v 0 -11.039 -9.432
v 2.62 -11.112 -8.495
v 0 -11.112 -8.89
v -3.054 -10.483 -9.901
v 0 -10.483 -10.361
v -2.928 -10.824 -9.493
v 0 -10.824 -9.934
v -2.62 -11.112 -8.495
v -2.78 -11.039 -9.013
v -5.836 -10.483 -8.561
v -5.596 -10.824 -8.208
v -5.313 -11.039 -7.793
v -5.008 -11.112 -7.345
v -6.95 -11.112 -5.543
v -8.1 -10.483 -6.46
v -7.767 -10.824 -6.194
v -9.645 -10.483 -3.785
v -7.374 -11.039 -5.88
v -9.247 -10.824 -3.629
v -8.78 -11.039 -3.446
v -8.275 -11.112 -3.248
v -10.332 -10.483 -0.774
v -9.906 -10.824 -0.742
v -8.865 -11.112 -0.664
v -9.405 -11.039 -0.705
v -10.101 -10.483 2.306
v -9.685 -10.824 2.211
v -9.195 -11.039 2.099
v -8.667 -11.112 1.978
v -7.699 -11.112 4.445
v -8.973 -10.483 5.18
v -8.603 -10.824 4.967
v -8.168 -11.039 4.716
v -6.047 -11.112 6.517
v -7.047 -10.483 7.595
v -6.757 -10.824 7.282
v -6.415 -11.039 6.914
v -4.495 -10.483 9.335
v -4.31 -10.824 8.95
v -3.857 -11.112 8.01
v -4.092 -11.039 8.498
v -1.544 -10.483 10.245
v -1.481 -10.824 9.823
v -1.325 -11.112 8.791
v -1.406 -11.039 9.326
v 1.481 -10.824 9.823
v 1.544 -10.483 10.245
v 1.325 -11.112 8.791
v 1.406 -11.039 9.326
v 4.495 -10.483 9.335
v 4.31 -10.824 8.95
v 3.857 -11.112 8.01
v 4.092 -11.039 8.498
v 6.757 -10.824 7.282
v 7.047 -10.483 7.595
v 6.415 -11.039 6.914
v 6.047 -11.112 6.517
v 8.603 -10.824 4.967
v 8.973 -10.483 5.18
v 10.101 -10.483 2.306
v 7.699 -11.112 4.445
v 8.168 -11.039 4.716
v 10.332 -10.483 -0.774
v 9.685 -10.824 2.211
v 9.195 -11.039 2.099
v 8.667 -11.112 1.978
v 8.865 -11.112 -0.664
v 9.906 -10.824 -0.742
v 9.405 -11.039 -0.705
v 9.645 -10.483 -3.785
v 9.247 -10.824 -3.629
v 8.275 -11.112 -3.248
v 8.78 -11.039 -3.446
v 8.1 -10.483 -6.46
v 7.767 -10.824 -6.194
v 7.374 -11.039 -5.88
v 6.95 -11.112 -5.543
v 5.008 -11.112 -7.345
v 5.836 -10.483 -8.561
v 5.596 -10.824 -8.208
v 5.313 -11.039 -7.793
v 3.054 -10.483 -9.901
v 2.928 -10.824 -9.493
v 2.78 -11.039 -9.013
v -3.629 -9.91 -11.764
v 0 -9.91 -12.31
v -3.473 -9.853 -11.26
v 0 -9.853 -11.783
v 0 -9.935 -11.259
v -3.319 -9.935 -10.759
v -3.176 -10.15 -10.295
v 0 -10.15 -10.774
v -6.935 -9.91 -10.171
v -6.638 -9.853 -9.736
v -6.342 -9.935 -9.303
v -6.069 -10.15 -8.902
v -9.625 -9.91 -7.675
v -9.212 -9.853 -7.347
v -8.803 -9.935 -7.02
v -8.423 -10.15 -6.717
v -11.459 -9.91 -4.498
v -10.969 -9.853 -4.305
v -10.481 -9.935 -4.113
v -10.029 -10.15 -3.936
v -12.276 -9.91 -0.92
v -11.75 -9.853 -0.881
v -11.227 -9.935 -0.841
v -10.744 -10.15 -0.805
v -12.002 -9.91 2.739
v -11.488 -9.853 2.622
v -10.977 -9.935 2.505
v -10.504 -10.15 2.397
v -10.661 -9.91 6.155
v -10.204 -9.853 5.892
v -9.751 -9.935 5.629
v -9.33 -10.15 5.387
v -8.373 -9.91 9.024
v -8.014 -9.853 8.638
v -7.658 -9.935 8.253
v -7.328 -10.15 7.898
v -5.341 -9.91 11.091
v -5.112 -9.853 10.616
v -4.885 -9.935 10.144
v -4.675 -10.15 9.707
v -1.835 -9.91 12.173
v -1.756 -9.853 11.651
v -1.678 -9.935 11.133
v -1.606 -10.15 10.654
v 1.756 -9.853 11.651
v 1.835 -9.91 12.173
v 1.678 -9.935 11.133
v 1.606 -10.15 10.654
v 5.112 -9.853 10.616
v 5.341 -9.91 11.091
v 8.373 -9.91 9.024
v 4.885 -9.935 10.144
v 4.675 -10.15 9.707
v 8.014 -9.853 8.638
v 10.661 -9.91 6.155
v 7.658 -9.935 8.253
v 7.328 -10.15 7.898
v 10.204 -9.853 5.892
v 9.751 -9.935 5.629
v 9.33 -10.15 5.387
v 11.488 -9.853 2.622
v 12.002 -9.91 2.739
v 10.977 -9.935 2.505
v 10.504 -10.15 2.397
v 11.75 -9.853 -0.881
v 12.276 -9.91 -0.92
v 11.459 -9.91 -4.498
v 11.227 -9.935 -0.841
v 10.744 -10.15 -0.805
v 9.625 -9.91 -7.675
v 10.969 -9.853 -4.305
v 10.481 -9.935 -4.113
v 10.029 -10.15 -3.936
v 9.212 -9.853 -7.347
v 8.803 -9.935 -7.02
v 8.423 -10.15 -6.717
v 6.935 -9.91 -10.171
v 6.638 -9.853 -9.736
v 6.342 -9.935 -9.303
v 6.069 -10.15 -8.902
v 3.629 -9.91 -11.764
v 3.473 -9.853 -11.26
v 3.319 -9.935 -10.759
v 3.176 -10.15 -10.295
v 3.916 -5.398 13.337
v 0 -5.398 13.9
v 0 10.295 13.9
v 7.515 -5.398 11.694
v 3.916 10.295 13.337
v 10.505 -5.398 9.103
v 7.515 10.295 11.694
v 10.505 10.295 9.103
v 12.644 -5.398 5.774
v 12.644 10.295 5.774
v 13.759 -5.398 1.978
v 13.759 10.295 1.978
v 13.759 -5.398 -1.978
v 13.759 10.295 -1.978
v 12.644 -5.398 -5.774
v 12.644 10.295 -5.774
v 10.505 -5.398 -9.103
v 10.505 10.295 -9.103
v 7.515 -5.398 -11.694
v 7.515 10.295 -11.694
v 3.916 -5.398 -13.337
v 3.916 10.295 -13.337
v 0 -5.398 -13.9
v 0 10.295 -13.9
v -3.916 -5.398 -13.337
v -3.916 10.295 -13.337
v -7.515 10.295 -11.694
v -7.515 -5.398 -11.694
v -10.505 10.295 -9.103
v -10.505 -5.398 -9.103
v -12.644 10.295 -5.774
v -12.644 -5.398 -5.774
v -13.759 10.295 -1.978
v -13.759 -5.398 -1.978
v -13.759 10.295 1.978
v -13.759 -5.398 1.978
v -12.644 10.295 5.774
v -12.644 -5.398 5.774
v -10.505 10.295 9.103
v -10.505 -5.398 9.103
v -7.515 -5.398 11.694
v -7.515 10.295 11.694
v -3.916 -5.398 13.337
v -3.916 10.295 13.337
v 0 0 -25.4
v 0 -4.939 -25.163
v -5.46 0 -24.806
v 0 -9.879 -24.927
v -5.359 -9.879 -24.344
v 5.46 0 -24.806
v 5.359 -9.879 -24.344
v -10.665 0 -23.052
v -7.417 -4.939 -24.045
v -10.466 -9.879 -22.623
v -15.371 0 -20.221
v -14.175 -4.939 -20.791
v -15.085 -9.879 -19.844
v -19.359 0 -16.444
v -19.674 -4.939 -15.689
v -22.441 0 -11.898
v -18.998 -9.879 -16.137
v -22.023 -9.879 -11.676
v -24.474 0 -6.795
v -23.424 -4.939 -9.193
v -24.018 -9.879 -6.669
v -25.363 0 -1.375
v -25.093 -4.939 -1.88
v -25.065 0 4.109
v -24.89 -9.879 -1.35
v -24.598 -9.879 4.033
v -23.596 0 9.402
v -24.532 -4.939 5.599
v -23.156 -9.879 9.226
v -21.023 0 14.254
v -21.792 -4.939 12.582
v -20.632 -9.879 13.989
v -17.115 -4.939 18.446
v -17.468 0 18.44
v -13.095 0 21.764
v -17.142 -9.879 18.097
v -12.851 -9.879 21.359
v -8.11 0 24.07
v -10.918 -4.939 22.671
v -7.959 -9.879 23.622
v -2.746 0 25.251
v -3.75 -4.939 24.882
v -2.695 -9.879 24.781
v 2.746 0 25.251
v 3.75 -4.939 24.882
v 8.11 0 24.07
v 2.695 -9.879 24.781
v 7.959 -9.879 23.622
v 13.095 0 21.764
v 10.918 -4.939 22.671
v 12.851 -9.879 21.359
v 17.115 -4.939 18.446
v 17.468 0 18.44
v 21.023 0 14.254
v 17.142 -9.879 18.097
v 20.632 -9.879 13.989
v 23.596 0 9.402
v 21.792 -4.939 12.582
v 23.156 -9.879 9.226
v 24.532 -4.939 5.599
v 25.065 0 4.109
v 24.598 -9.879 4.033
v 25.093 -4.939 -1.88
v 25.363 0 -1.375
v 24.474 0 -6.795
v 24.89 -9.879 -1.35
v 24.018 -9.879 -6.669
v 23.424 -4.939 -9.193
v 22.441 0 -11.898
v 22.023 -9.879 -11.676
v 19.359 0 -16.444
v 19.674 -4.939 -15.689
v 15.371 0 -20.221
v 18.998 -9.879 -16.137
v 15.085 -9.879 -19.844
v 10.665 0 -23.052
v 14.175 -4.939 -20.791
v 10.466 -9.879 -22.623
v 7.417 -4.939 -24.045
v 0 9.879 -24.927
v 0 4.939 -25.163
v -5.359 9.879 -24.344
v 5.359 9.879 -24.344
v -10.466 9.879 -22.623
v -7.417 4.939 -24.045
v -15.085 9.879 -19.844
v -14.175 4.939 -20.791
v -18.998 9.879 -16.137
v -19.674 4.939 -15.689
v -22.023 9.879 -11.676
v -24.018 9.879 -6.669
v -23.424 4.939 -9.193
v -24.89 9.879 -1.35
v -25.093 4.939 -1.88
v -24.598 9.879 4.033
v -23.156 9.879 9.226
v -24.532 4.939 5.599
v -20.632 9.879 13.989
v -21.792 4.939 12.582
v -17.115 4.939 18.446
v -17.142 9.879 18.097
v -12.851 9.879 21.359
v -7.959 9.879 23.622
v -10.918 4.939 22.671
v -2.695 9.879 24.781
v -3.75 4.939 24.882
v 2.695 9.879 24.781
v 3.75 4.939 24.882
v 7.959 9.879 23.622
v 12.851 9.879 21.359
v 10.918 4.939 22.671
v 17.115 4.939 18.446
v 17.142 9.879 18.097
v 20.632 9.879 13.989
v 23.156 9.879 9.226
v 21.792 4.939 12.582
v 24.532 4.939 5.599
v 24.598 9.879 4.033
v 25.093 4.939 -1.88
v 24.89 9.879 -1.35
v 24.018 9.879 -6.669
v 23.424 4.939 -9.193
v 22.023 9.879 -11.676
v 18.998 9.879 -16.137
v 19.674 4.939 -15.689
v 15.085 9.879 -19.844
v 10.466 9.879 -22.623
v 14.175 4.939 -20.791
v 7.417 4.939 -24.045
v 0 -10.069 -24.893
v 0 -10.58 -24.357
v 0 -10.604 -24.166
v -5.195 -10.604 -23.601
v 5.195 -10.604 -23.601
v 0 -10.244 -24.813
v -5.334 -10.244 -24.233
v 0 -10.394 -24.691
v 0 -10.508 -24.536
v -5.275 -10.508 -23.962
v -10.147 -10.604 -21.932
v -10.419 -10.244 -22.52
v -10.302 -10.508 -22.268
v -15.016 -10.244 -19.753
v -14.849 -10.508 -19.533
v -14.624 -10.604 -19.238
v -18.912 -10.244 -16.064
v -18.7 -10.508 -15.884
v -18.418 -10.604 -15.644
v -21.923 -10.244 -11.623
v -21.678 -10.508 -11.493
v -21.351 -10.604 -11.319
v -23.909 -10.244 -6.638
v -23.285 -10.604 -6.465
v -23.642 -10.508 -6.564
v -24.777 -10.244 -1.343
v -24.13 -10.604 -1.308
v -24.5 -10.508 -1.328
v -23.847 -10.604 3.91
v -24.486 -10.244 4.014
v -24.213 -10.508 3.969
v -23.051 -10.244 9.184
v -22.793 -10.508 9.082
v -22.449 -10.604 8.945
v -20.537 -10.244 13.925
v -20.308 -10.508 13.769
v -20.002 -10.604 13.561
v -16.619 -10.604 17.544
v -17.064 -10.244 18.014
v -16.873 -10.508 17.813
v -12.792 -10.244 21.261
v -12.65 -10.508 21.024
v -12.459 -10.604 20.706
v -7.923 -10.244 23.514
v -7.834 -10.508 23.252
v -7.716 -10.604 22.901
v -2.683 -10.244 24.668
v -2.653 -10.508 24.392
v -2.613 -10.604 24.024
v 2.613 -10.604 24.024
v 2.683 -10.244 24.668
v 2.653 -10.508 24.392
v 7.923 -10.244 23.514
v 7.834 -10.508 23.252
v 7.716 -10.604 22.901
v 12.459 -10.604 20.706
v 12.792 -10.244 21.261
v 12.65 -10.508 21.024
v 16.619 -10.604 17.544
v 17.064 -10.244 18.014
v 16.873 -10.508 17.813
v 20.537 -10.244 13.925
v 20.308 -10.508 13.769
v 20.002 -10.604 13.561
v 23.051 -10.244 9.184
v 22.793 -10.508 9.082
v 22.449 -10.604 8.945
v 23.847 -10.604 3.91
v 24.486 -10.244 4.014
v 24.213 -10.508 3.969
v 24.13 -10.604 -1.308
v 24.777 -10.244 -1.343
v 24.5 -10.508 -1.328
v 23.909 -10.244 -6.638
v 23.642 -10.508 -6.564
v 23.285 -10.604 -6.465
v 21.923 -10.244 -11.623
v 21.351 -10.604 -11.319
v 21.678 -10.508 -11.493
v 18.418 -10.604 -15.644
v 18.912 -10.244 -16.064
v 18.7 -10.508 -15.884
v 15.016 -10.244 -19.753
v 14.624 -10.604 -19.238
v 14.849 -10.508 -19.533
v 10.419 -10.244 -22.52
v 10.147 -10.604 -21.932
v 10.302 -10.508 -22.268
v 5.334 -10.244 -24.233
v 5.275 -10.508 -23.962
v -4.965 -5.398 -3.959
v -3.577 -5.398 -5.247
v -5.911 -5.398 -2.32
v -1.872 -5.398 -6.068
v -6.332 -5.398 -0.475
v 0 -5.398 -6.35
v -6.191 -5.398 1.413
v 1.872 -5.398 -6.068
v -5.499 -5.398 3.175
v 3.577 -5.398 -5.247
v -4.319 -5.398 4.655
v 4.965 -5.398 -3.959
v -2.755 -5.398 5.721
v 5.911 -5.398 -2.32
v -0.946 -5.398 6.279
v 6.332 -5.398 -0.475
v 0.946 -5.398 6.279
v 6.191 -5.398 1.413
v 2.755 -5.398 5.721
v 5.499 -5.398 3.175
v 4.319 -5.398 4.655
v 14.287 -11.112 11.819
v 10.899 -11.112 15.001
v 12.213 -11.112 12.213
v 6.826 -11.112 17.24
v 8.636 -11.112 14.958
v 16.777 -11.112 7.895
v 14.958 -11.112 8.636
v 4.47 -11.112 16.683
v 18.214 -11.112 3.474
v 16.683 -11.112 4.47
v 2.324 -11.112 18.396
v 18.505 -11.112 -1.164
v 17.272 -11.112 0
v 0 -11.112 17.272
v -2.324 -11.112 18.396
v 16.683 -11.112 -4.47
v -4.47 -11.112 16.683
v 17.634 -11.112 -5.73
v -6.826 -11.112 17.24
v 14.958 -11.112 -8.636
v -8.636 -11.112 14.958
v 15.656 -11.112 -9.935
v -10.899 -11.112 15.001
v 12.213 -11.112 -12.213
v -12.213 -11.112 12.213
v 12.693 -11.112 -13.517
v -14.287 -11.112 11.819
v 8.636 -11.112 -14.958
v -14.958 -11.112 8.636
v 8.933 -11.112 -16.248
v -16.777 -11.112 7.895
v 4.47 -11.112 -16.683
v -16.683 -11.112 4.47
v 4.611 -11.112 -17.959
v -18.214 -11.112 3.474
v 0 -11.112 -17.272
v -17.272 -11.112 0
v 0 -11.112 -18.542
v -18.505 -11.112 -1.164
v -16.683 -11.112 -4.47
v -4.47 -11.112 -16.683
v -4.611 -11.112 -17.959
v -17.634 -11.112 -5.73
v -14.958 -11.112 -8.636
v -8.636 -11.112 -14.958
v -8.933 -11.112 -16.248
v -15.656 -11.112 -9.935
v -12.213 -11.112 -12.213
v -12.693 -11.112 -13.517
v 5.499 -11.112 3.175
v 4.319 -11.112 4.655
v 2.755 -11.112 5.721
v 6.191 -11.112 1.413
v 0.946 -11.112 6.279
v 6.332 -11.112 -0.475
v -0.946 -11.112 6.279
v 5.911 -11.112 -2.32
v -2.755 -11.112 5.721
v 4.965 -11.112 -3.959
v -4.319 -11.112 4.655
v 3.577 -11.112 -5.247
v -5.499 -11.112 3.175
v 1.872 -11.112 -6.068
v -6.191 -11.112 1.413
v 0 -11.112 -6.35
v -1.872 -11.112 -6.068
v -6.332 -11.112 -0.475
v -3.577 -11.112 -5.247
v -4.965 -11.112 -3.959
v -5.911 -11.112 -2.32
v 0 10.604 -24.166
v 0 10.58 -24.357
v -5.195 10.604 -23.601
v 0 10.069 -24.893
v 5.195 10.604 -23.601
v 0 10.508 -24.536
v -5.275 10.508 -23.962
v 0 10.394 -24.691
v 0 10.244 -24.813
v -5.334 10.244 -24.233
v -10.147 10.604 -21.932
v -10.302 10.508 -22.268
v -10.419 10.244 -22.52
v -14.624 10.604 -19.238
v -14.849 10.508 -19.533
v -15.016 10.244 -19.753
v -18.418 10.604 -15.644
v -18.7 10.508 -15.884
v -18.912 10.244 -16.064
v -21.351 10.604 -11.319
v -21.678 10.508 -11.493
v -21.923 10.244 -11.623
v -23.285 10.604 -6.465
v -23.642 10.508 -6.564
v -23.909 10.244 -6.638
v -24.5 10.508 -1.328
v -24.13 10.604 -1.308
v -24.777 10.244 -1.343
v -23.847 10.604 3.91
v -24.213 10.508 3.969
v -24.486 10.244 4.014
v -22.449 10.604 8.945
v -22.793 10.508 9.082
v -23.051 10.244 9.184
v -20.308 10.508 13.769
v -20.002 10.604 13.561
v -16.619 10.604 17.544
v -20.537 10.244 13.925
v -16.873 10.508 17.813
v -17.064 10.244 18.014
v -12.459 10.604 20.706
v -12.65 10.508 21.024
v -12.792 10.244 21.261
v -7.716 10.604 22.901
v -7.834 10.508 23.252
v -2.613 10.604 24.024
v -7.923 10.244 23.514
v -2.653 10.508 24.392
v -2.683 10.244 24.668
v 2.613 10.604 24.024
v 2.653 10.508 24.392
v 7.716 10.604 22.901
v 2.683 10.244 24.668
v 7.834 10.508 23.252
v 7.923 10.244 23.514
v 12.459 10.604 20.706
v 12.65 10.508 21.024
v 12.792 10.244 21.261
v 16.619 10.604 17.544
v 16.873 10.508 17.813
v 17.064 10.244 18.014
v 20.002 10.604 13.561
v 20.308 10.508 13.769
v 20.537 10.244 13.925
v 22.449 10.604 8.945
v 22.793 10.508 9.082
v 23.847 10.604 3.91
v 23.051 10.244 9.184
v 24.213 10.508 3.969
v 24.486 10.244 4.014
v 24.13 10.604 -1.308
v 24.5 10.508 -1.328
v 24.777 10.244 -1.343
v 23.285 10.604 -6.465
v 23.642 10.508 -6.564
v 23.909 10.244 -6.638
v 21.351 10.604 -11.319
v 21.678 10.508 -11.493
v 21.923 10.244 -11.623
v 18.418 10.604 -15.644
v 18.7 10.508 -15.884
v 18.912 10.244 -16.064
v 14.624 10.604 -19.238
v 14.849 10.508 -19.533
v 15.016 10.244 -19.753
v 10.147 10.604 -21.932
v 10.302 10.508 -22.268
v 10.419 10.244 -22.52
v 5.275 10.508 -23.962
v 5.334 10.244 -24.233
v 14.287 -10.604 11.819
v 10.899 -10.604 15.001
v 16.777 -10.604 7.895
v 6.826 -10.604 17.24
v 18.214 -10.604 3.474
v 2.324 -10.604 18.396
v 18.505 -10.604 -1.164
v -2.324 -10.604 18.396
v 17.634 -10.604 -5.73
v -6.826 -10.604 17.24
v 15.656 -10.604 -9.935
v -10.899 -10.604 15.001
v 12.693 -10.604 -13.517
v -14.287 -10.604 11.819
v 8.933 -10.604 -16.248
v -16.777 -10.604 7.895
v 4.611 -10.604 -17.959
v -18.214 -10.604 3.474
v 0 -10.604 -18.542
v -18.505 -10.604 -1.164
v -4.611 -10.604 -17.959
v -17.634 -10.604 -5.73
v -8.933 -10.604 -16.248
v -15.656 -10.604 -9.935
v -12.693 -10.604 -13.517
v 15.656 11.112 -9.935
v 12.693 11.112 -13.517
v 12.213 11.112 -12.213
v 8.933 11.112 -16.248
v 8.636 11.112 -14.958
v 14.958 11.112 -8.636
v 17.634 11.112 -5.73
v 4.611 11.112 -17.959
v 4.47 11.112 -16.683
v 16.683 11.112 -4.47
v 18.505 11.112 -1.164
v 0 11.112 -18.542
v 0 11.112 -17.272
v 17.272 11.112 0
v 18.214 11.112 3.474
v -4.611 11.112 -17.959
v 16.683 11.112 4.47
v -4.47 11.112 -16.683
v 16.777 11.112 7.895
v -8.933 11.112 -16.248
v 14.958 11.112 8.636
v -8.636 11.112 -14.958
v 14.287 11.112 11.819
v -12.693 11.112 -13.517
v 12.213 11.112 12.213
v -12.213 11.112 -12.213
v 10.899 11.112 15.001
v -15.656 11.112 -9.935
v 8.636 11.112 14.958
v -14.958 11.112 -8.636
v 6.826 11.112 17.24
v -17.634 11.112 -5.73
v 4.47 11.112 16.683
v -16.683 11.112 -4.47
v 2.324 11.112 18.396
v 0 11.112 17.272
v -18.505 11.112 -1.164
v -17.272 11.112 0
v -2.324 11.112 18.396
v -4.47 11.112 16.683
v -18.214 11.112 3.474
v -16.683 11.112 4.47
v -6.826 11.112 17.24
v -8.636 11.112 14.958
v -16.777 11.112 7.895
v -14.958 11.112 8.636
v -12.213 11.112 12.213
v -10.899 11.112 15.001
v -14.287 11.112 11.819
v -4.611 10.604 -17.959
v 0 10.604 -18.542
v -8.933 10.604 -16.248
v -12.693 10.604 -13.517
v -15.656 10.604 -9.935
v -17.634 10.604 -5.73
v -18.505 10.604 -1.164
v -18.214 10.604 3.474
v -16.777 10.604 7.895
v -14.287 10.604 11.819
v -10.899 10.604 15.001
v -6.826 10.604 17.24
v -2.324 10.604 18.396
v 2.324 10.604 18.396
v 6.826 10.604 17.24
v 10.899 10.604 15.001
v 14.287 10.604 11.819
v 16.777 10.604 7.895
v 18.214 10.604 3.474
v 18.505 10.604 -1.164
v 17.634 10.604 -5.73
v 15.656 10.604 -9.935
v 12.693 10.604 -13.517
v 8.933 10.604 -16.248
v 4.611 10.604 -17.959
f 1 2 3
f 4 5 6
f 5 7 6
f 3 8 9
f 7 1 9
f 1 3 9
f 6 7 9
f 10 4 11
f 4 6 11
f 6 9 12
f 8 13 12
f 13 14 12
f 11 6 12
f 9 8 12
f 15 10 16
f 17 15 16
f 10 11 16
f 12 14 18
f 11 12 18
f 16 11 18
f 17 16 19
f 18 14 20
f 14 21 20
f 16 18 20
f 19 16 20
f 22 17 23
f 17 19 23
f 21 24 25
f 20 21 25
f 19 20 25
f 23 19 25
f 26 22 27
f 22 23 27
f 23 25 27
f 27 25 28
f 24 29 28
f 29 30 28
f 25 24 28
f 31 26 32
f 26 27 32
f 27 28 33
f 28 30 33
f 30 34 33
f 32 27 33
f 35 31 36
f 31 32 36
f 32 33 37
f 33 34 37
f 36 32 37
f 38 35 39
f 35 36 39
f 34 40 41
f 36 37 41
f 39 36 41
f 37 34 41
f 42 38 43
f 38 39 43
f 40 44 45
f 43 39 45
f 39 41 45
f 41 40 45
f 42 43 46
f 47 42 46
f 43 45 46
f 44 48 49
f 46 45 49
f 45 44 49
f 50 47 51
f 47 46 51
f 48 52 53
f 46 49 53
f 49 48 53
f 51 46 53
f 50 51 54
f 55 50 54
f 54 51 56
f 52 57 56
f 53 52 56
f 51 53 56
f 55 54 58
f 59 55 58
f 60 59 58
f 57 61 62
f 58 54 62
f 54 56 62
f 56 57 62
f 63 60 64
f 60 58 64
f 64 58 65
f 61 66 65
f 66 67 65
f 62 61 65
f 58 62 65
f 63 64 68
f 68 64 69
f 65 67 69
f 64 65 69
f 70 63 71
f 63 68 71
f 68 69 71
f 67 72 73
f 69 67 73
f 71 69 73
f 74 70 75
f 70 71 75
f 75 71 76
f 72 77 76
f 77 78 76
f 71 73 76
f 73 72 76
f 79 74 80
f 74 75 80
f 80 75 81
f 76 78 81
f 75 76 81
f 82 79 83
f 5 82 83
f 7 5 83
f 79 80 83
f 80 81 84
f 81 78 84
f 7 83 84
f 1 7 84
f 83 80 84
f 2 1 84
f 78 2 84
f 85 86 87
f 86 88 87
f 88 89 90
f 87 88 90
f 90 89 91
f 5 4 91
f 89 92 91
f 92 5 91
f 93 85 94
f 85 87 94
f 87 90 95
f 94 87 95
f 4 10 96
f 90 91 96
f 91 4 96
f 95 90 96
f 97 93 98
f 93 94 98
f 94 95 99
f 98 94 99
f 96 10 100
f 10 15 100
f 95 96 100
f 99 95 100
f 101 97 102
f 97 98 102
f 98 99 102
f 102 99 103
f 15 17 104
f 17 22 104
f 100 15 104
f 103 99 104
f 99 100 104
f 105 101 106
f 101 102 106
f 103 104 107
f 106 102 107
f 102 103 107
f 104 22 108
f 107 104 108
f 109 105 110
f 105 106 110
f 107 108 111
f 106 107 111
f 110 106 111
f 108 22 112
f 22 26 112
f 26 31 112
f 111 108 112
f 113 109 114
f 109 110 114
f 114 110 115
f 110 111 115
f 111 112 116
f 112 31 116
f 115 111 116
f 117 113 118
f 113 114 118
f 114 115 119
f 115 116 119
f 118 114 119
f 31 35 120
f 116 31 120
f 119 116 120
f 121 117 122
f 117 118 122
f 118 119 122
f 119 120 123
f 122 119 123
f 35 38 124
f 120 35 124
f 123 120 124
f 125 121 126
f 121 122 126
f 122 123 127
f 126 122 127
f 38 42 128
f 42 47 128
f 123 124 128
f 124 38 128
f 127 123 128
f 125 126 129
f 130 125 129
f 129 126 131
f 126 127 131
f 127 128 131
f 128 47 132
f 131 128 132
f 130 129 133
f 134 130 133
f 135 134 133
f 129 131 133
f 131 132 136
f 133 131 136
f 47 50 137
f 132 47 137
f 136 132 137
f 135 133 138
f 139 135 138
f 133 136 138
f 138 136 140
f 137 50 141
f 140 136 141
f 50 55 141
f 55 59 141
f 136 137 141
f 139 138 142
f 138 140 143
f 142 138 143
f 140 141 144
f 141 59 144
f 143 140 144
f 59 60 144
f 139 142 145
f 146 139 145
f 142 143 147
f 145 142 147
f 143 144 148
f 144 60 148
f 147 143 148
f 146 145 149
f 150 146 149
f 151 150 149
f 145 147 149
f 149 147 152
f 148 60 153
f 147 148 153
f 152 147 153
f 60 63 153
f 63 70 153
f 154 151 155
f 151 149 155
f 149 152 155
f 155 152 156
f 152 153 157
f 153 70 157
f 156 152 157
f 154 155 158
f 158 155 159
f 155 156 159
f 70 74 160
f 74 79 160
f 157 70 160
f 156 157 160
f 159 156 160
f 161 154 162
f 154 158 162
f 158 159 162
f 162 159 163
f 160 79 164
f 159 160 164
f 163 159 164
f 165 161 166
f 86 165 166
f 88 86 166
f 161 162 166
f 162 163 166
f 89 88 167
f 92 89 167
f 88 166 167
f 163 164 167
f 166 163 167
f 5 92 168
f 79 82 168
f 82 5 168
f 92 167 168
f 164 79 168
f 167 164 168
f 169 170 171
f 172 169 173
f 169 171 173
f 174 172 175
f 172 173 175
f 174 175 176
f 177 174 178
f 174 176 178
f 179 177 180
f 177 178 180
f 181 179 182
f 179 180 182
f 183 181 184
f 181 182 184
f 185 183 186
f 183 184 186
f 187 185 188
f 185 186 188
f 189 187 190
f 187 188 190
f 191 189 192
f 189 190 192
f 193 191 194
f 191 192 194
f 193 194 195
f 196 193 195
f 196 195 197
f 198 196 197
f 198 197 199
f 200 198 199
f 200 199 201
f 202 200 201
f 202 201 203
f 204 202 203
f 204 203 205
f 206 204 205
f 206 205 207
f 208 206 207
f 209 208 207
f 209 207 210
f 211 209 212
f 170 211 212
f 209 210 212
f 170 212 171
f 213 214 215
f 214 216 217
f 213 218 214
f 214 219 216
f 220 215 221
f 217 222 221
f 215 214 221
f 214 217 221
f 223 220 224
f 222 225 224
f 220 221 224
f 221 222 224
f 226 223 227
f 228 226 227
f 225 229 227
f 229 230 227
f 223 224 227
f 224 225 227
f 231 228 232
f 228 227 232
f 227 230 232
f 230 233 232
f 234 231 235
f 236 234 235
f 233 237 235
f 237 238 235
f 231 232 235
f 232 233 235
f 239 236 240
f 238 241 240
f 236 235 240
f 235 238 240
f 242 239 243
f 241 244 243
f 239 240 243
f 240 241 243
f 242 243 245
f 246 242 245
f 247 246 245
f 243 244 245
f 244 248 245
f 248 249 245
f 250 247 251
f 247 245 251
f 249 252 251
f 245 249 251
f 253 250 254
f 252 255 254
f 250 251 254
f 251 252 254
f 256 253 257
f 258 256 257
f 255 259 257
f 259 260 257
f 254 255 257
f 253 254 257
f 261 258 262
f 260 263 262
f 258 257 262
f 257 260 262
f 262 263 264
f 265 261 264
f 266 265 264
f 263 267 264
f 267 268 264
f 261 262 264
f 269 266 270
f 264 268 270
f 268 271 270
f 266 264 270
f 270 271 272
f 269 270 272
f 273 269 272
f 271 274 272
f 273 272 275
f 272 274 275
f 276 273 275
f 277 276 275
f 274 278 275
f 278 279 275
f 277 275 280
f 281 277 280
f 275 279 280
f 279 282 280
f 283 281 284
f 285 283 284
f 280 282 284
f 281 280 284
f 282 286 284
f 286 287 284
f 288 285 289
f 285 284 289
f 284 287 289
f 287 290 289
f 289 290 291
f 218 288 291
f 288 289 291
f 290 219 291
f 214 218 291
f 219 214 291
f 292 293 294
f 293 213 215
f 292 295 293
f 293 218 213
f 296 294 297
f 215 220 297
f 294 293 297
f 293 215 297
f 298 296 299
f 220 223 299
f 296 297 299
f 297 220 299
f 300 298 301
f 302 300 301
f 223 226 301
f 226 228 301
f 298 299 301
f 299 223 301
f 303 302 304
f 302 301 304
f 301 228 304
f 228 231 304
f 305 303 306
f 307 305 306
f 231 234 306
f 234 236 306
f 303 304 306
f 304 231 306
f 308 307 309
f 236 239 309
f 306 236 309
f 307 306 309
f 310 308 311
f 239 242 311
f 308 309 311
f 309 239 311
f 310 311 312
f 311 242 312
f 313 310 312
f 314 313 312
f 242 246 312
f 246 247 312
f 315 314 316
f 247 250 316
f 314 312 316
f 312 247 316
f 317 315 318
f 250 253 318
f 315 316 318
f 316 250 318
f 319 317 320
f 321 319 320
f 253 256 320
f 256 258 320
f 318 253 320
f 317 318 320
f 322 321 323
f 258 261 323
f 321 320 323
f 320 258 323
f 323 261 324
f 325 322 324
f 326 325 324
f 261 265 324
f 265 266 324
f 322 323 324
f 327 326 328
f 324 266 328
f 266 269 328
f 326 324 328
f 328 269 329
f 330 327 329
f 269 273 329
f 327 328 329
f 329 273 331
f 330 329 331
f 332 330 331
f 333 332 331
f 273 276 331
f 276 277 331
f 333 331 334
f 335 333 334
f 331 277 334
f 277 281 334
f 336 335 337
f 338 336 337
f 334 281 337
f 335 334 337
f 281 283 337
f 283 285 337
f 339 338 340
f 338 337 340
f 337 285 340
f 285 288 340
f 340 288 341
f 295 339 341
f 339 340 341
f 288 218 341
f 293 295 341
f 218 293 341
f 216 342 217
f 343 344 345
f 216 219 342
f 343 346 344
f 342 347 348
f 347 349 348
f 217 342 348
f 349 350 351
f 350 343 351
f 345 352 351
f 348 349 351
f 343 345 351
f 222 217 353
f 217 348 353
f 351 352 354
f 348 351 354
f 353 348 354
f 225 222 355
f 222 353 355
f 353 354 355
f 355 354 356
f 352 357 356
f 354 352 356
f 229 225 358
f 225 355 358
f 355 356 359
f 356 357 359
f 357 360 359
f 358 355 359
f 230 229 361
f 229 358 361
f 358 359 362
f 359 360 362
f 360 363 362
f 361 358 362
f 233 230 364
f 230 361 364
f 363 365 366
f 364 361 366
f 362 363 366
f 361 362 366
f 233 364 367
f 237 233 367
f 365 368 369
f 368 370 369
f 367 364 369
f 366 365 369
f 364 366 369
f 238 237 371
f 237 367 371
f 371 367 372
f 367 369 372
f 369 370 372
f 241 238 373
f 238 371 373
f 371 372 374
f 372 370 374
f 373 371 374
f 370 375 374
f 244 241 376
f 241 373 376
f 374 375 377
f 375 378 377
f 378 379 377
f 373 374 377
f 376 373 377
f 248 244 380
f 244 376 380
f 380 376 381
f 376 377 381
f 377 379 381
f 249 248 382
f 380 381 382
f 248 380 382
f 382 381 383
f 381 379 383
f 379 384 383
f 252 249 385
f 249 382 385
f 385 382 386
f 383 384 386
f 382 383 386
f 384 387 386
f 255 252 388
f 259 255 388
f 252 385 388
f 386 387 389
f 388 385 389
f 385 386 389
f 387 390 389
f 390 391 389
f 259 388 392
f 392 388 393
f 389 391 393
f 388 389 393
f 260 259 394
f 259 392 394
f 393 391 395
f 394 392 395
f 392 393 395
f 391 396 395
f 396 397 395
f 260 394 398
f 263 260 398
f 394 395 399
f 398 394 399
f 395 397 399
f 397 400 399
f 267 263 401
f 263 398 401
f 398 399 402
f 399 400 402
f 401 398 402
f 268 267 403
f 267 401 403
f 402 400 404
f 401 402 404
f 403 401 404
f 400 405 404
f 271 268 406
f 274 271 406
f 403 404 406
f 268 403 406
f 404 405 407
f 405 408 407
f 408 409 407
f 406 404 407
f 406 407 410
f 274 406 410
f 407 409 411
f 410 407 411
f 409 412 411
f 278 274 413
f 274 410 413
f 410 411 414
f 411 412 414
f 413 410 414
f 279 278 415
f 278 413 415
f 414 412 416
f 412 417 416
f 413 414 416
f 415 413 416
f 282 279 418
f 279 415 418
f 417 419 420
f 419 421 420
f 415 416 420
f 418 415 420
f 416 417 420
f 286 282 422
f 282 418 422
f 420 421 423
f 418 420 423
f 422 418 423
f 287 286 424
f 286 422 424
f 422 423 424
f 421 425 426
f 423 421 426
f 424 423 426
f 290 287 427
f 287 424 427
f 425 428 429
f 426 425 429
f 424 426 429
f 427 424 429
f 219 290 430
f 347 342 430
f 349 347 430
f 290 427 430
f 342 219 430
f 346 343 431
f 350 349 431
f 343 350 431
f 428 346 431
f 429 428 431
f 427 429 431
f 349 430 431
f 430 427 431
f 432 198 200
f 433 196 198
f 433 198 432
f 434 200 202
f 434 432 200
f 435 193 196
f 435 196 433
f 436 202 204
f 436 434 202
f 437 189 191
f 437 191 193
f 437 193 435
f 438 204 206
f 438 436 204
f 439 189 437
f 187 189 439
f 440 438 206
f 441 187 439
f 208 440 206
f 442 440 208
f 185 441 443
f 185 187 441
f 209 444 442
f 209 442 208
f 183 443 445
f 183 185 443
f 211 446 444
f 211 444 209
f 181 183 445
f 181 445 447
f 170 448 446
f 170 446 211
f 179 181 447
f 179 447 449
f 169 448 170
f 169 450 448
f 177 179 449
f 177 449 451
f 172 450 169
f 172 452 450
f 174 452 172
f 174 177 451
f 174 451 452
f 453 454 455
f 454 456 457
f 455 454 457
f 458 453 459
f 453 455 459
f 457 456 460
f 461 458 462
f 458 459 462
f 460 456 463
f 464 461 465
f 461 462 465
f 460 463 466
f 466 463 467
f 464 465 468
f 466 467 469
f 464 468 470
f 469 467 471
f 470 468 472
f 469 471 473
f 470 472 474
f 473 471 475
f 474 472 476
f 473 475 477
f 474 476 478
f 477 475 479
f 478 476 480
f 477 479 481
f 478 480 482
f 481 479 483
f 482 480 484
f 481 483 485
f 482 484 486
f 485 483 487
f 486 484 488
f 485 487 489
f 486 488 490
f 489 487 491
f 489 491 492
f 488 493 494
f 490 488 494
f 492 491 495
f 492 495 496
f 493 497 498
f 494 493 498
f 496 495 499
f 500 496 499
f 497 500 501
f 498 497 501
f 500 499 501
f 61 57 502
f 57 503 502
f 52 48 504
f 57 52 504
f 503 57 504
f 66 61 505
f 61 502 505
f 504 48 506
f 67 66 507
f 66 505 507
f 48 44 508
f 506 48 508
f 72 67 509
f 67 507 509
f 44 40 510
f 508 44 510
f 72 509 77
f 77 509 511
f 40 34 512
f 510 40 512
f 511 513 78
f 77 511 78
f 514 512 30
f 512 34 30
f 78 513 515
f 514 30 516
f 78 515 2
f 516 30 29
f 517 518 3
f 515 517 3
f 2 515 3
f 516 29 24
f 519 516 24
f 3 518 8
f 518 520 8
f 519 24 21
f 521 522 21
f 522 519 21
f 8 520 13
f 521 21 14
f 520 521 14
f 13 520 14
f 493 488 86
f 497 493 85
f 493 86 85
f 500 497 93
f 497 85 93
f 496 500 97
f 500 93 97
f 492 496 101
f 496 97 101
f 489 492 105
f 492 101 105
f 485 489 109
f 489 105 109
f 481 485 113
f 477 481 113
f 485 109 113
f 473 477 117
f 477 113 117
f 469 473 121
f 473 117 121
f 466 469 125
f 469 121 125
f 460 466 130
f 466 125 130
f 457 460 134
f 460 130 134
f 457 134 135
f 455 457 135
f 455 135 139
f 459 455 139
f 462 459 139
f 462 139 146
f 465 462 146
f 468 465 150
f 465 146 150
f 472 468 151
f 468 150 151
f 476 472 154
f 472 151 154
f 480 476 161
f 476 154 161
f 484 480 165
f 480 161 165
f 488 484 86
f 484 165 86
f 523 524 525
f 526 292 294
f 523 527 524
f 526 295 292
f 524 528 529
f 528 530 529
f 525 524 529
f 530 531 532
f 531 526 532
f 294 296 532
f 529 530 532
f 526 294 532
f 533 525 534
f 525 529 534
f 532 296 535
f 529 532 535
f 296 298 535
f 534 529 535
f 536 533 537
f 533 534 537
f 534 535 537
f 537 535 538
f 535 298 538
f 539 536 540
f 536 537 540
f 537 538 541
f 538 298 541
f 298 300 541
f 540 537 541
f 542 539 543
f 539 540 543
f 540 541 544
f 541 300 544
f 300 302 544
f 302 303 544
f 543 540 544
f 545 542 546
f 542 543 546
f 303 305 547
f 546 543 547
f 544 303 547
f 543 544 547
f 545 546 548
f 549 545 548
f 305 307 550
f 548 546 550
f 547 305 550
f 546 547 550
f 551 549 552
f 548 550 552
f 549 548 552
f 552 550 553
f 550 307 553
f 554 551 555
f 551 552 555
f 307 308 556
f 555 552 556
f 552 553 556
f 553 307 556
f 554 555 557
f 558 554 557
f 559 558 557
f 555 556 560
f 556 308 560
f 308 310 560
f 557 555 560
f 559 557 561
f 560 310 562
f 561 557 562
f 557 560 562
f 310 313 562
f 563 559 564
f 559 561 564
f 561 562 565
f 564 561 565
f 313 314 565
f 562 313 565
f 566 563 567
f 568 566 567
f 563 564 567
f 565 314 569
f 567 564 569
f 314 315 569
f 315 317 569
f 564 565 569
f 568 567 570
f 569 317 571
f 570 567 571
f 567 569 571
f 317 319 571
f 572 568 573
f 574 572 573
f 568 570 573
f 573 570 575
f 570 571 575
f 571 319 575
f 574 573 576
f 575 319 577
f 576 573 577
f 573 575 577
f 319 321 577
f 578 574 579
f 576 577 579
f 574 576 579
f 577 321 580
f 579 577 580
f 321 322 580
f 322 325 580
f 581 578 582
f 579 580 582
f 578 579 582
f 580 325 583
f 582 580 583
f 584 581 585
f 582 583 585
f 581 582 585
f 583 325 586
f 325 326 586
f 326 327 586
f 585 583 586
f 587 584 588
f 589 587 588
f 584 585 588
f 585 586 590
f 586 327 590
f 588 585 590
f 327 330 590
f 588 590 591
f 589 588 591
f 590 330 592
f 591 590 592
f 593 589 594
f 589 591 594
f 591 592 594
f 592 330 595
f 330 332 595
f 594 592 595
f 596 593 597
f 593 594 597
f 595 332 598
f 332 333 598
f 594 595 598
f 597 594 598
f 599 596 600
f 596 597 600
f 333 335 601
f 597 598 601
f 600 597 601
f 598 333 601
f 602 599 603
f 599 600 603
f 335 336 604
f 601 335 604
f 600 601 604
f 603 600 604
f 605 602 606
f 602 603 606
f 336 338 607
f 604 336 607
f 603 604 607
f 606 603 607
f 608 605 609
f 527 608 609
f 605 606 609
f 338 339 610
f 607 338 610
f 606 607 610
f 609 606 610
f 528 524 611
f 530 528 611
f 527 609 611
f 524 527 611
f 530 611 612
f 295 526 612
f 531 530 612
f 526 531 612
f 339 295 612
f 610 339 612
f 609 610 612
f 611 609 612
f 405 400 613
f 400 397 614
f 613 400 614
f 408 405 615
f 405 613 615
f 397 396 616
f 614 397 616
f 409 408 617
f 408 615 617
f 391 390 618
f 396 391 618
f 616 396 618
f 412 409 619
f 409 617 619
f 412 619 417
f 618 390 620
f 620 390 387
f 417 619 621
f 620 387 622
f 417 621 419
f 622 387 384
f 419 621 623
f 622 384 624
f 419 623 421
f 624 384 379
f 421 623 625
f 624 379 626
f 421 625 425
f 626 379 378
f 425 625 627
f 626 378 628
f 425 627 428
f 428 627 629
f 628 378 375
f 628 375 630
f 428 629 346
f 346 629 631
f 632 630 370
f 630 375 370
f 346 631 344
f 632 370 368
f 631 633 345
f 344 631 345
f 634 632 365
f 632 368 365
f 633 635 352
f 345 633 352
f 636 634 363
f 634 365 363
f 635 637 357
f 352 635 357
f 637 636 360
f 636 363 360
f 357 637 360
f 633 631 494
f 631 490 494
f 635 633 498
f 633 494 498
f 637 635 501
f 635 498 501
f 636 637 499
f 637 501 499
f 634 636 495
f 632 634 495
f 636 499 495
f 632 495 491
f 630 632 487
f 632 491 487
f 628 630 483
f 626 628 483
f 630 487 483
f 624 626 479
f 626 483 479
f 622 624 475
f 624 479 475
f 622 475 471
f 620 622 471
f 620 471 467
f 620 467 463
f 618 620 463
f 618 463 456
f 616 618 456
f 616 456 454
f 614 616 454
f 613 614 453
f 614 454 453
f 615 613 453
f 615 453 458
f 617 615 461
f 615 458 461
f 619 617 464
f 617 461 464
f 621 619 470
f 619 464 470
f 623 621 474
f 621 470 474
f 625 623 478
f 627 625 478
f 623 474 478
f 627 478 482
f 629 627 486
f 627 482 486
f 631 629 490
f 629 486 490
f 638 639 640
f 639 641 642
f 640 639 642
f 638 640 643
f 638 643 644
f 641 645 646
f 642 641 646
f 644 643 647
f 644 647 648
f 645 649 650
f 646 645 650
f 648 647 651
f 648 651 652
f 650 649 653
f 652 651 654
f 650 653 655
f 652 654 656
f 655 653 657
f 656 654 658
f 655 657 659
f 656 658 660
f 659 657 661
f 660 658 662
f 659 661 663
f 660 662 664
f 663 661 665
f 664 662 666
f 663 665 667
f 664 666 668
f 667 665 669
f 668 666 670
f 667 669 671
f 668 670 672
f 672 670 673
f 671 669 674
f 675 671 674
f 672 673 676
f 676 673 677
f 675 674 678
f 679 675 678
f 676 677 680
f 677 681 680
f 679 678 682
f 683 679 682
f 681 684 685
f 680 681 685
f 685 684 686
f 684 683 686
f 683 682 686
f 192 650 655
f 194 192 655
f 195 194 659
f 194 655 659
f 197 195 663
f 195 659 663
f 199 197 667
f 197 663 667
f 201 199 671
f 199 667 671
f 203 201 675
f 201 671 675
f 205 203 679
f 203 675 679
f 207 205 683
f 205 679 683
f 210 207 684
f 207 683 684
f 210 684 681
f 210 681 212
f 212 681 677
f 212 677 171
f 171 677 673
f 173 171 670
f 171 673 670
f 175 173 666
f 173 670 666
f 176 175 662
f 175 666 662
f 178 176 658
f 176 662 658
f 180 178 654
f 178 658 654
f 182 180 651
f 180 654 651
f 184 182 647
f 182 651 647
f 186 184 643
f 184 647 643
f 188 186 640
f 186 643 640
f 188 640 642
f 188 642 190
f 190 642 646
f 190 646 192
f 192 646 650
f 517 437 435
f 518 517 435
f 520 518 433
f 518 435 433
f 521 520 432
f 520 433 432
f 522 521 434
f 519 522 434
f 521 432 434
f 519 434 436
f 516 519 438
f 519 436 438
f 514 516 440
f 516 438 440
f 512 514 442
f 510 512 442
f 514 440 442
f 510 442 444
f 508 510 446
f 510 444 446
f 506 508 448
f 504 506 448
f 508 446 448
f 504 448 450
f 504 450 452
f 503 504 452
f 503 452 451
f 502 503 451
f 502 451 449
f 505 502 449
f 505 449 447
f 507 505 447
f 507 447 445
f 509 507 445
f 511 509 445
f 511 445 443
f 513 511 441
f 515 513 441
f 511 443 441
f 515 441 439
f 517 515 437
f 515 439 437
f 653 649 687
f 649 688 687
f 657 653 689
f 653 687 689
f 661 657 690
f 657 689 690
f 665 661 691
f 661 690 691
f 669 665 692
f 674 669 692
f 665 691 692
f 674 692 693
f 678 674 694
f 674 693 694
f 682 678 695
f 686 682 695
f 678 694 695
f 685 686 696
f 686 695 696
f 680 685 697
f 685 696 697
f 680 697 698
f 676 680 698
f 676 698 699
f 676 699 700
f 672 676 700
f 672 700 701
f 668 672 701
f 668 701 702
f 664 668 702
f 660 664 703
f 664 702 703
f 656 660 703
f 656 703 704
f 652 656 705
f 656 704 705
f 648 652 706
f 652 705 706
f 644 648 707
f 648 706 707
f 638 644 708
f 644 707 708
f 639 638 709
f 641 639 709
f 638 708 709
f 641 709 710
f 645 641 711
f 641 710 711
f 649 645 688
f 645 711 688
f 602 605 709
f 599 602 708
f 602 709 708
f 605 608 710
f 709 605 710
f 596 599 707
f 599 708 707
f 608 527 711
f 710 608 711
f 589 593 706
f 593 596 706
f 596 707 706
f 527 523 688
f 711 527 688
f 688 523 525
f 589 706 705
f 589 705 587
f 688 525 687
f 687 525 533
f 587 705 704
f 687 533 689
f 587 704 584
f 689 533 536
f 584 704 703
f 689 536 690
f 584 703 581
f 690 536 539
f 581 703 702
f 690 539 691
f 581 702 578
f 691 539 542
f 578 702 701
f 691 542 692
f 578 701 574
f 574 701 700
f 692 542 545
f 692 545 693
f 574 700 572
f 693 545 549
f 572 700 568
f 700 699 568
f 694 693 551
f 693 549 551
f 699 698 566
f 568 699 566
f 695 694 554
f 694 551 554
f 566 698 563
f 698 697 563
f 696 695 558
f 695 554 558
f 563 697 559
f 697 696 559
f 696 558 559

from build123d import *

# Parameters (mm, degrees)
FILLET1_R          = 0.762
SKETCH3_R          = 13.90015
CUT_EXTRUDE1_DEPTH = 16.51


with BuildPart() as part:
    # Sketch2 → Revolve1 (revolve)
    with BuildSketch(Plane.XY, mode=Mode.PRIVATE) as revolve1_sk:
        with BuildLine():
            Line((6.35, -11.1125), (6.35, 11.1125))
            Line((6.35, 11.1125), (8.89, 11.1125))
            ThreePointArc((8.89, 11.1125), (9.690049959, 10.948371533), (10.360856835, 10.482500061))
            ThreePointArc((10.360856835, 10.482500061), (11.258914316, 9.934904036), (12.310452921, 9.909700708))
            Line((12.310452921, 9.909700708), (17.272, 11.1125))
            Line((17.272, 11.1125), (18.542, 11.1125))
            Line((18.542, 11.1125), (18.542, 10.6045))
            Line((18.542, 10.6045), (24.892, 10.6045))
            Line((24.892, 10.6045), (25.4, 0))
            Line((25.4, 0), (24.892, -10.6045))
            Line((24.892, -10.6045), (18.542, -10.6045))
            Line((18.542, -10.6045), (18.542, -11.1125))
            Line((18.542, -11.1125), (17.272, -11.1125))
            Line((17.272, -11.1125), (12.310452921, -9.909700708))
            ThreePointArc((12.310452921, -9.909700708), (11.258914316, -9.934904036), (10.360856835, -10.482500061))
            ThreePointArc((10.360856835, -10.482500061), (9.690049959, -10.948371533), (8.89, -11.1125))
            Line((8.89, -11.1125), (6.35, -11.1125))
        make_face()
    revolve(revolve1_sk.sketch.rotate(Axis((0, 0, 0), (0, 1, 0)), 90), axis=Axis((0, 0, 0), (0, 1, 0)))  # turned: the seam where the file's is

    # Fillet1
    fillet1_edges = [part.edges().sort_by_distance(p)[0] for p in [
        (0, -10.6045, 24.892),
        (0, 10.6045, 24.892),
    ]]
    fillet(fillet1_edges, radius=FILLET1_R)

    # Sketch3 → Cut-Extrude1 (cut)
    with BuildSketch(Plane(origin=(0, 11.1125, 0), x_dir=(-1, 0, 0), z_dir=(0, 1, 0))):
        with Locations(Location((0, 0, 0), (0, 0, 90))):  # turned: the seam where the file's is
            Circle(SKETCH3_R)
    extrude(amount=-CUT_EXTRUDE1_DEPTH, mode=Mode.SUBTRACT)


solid = part.part
